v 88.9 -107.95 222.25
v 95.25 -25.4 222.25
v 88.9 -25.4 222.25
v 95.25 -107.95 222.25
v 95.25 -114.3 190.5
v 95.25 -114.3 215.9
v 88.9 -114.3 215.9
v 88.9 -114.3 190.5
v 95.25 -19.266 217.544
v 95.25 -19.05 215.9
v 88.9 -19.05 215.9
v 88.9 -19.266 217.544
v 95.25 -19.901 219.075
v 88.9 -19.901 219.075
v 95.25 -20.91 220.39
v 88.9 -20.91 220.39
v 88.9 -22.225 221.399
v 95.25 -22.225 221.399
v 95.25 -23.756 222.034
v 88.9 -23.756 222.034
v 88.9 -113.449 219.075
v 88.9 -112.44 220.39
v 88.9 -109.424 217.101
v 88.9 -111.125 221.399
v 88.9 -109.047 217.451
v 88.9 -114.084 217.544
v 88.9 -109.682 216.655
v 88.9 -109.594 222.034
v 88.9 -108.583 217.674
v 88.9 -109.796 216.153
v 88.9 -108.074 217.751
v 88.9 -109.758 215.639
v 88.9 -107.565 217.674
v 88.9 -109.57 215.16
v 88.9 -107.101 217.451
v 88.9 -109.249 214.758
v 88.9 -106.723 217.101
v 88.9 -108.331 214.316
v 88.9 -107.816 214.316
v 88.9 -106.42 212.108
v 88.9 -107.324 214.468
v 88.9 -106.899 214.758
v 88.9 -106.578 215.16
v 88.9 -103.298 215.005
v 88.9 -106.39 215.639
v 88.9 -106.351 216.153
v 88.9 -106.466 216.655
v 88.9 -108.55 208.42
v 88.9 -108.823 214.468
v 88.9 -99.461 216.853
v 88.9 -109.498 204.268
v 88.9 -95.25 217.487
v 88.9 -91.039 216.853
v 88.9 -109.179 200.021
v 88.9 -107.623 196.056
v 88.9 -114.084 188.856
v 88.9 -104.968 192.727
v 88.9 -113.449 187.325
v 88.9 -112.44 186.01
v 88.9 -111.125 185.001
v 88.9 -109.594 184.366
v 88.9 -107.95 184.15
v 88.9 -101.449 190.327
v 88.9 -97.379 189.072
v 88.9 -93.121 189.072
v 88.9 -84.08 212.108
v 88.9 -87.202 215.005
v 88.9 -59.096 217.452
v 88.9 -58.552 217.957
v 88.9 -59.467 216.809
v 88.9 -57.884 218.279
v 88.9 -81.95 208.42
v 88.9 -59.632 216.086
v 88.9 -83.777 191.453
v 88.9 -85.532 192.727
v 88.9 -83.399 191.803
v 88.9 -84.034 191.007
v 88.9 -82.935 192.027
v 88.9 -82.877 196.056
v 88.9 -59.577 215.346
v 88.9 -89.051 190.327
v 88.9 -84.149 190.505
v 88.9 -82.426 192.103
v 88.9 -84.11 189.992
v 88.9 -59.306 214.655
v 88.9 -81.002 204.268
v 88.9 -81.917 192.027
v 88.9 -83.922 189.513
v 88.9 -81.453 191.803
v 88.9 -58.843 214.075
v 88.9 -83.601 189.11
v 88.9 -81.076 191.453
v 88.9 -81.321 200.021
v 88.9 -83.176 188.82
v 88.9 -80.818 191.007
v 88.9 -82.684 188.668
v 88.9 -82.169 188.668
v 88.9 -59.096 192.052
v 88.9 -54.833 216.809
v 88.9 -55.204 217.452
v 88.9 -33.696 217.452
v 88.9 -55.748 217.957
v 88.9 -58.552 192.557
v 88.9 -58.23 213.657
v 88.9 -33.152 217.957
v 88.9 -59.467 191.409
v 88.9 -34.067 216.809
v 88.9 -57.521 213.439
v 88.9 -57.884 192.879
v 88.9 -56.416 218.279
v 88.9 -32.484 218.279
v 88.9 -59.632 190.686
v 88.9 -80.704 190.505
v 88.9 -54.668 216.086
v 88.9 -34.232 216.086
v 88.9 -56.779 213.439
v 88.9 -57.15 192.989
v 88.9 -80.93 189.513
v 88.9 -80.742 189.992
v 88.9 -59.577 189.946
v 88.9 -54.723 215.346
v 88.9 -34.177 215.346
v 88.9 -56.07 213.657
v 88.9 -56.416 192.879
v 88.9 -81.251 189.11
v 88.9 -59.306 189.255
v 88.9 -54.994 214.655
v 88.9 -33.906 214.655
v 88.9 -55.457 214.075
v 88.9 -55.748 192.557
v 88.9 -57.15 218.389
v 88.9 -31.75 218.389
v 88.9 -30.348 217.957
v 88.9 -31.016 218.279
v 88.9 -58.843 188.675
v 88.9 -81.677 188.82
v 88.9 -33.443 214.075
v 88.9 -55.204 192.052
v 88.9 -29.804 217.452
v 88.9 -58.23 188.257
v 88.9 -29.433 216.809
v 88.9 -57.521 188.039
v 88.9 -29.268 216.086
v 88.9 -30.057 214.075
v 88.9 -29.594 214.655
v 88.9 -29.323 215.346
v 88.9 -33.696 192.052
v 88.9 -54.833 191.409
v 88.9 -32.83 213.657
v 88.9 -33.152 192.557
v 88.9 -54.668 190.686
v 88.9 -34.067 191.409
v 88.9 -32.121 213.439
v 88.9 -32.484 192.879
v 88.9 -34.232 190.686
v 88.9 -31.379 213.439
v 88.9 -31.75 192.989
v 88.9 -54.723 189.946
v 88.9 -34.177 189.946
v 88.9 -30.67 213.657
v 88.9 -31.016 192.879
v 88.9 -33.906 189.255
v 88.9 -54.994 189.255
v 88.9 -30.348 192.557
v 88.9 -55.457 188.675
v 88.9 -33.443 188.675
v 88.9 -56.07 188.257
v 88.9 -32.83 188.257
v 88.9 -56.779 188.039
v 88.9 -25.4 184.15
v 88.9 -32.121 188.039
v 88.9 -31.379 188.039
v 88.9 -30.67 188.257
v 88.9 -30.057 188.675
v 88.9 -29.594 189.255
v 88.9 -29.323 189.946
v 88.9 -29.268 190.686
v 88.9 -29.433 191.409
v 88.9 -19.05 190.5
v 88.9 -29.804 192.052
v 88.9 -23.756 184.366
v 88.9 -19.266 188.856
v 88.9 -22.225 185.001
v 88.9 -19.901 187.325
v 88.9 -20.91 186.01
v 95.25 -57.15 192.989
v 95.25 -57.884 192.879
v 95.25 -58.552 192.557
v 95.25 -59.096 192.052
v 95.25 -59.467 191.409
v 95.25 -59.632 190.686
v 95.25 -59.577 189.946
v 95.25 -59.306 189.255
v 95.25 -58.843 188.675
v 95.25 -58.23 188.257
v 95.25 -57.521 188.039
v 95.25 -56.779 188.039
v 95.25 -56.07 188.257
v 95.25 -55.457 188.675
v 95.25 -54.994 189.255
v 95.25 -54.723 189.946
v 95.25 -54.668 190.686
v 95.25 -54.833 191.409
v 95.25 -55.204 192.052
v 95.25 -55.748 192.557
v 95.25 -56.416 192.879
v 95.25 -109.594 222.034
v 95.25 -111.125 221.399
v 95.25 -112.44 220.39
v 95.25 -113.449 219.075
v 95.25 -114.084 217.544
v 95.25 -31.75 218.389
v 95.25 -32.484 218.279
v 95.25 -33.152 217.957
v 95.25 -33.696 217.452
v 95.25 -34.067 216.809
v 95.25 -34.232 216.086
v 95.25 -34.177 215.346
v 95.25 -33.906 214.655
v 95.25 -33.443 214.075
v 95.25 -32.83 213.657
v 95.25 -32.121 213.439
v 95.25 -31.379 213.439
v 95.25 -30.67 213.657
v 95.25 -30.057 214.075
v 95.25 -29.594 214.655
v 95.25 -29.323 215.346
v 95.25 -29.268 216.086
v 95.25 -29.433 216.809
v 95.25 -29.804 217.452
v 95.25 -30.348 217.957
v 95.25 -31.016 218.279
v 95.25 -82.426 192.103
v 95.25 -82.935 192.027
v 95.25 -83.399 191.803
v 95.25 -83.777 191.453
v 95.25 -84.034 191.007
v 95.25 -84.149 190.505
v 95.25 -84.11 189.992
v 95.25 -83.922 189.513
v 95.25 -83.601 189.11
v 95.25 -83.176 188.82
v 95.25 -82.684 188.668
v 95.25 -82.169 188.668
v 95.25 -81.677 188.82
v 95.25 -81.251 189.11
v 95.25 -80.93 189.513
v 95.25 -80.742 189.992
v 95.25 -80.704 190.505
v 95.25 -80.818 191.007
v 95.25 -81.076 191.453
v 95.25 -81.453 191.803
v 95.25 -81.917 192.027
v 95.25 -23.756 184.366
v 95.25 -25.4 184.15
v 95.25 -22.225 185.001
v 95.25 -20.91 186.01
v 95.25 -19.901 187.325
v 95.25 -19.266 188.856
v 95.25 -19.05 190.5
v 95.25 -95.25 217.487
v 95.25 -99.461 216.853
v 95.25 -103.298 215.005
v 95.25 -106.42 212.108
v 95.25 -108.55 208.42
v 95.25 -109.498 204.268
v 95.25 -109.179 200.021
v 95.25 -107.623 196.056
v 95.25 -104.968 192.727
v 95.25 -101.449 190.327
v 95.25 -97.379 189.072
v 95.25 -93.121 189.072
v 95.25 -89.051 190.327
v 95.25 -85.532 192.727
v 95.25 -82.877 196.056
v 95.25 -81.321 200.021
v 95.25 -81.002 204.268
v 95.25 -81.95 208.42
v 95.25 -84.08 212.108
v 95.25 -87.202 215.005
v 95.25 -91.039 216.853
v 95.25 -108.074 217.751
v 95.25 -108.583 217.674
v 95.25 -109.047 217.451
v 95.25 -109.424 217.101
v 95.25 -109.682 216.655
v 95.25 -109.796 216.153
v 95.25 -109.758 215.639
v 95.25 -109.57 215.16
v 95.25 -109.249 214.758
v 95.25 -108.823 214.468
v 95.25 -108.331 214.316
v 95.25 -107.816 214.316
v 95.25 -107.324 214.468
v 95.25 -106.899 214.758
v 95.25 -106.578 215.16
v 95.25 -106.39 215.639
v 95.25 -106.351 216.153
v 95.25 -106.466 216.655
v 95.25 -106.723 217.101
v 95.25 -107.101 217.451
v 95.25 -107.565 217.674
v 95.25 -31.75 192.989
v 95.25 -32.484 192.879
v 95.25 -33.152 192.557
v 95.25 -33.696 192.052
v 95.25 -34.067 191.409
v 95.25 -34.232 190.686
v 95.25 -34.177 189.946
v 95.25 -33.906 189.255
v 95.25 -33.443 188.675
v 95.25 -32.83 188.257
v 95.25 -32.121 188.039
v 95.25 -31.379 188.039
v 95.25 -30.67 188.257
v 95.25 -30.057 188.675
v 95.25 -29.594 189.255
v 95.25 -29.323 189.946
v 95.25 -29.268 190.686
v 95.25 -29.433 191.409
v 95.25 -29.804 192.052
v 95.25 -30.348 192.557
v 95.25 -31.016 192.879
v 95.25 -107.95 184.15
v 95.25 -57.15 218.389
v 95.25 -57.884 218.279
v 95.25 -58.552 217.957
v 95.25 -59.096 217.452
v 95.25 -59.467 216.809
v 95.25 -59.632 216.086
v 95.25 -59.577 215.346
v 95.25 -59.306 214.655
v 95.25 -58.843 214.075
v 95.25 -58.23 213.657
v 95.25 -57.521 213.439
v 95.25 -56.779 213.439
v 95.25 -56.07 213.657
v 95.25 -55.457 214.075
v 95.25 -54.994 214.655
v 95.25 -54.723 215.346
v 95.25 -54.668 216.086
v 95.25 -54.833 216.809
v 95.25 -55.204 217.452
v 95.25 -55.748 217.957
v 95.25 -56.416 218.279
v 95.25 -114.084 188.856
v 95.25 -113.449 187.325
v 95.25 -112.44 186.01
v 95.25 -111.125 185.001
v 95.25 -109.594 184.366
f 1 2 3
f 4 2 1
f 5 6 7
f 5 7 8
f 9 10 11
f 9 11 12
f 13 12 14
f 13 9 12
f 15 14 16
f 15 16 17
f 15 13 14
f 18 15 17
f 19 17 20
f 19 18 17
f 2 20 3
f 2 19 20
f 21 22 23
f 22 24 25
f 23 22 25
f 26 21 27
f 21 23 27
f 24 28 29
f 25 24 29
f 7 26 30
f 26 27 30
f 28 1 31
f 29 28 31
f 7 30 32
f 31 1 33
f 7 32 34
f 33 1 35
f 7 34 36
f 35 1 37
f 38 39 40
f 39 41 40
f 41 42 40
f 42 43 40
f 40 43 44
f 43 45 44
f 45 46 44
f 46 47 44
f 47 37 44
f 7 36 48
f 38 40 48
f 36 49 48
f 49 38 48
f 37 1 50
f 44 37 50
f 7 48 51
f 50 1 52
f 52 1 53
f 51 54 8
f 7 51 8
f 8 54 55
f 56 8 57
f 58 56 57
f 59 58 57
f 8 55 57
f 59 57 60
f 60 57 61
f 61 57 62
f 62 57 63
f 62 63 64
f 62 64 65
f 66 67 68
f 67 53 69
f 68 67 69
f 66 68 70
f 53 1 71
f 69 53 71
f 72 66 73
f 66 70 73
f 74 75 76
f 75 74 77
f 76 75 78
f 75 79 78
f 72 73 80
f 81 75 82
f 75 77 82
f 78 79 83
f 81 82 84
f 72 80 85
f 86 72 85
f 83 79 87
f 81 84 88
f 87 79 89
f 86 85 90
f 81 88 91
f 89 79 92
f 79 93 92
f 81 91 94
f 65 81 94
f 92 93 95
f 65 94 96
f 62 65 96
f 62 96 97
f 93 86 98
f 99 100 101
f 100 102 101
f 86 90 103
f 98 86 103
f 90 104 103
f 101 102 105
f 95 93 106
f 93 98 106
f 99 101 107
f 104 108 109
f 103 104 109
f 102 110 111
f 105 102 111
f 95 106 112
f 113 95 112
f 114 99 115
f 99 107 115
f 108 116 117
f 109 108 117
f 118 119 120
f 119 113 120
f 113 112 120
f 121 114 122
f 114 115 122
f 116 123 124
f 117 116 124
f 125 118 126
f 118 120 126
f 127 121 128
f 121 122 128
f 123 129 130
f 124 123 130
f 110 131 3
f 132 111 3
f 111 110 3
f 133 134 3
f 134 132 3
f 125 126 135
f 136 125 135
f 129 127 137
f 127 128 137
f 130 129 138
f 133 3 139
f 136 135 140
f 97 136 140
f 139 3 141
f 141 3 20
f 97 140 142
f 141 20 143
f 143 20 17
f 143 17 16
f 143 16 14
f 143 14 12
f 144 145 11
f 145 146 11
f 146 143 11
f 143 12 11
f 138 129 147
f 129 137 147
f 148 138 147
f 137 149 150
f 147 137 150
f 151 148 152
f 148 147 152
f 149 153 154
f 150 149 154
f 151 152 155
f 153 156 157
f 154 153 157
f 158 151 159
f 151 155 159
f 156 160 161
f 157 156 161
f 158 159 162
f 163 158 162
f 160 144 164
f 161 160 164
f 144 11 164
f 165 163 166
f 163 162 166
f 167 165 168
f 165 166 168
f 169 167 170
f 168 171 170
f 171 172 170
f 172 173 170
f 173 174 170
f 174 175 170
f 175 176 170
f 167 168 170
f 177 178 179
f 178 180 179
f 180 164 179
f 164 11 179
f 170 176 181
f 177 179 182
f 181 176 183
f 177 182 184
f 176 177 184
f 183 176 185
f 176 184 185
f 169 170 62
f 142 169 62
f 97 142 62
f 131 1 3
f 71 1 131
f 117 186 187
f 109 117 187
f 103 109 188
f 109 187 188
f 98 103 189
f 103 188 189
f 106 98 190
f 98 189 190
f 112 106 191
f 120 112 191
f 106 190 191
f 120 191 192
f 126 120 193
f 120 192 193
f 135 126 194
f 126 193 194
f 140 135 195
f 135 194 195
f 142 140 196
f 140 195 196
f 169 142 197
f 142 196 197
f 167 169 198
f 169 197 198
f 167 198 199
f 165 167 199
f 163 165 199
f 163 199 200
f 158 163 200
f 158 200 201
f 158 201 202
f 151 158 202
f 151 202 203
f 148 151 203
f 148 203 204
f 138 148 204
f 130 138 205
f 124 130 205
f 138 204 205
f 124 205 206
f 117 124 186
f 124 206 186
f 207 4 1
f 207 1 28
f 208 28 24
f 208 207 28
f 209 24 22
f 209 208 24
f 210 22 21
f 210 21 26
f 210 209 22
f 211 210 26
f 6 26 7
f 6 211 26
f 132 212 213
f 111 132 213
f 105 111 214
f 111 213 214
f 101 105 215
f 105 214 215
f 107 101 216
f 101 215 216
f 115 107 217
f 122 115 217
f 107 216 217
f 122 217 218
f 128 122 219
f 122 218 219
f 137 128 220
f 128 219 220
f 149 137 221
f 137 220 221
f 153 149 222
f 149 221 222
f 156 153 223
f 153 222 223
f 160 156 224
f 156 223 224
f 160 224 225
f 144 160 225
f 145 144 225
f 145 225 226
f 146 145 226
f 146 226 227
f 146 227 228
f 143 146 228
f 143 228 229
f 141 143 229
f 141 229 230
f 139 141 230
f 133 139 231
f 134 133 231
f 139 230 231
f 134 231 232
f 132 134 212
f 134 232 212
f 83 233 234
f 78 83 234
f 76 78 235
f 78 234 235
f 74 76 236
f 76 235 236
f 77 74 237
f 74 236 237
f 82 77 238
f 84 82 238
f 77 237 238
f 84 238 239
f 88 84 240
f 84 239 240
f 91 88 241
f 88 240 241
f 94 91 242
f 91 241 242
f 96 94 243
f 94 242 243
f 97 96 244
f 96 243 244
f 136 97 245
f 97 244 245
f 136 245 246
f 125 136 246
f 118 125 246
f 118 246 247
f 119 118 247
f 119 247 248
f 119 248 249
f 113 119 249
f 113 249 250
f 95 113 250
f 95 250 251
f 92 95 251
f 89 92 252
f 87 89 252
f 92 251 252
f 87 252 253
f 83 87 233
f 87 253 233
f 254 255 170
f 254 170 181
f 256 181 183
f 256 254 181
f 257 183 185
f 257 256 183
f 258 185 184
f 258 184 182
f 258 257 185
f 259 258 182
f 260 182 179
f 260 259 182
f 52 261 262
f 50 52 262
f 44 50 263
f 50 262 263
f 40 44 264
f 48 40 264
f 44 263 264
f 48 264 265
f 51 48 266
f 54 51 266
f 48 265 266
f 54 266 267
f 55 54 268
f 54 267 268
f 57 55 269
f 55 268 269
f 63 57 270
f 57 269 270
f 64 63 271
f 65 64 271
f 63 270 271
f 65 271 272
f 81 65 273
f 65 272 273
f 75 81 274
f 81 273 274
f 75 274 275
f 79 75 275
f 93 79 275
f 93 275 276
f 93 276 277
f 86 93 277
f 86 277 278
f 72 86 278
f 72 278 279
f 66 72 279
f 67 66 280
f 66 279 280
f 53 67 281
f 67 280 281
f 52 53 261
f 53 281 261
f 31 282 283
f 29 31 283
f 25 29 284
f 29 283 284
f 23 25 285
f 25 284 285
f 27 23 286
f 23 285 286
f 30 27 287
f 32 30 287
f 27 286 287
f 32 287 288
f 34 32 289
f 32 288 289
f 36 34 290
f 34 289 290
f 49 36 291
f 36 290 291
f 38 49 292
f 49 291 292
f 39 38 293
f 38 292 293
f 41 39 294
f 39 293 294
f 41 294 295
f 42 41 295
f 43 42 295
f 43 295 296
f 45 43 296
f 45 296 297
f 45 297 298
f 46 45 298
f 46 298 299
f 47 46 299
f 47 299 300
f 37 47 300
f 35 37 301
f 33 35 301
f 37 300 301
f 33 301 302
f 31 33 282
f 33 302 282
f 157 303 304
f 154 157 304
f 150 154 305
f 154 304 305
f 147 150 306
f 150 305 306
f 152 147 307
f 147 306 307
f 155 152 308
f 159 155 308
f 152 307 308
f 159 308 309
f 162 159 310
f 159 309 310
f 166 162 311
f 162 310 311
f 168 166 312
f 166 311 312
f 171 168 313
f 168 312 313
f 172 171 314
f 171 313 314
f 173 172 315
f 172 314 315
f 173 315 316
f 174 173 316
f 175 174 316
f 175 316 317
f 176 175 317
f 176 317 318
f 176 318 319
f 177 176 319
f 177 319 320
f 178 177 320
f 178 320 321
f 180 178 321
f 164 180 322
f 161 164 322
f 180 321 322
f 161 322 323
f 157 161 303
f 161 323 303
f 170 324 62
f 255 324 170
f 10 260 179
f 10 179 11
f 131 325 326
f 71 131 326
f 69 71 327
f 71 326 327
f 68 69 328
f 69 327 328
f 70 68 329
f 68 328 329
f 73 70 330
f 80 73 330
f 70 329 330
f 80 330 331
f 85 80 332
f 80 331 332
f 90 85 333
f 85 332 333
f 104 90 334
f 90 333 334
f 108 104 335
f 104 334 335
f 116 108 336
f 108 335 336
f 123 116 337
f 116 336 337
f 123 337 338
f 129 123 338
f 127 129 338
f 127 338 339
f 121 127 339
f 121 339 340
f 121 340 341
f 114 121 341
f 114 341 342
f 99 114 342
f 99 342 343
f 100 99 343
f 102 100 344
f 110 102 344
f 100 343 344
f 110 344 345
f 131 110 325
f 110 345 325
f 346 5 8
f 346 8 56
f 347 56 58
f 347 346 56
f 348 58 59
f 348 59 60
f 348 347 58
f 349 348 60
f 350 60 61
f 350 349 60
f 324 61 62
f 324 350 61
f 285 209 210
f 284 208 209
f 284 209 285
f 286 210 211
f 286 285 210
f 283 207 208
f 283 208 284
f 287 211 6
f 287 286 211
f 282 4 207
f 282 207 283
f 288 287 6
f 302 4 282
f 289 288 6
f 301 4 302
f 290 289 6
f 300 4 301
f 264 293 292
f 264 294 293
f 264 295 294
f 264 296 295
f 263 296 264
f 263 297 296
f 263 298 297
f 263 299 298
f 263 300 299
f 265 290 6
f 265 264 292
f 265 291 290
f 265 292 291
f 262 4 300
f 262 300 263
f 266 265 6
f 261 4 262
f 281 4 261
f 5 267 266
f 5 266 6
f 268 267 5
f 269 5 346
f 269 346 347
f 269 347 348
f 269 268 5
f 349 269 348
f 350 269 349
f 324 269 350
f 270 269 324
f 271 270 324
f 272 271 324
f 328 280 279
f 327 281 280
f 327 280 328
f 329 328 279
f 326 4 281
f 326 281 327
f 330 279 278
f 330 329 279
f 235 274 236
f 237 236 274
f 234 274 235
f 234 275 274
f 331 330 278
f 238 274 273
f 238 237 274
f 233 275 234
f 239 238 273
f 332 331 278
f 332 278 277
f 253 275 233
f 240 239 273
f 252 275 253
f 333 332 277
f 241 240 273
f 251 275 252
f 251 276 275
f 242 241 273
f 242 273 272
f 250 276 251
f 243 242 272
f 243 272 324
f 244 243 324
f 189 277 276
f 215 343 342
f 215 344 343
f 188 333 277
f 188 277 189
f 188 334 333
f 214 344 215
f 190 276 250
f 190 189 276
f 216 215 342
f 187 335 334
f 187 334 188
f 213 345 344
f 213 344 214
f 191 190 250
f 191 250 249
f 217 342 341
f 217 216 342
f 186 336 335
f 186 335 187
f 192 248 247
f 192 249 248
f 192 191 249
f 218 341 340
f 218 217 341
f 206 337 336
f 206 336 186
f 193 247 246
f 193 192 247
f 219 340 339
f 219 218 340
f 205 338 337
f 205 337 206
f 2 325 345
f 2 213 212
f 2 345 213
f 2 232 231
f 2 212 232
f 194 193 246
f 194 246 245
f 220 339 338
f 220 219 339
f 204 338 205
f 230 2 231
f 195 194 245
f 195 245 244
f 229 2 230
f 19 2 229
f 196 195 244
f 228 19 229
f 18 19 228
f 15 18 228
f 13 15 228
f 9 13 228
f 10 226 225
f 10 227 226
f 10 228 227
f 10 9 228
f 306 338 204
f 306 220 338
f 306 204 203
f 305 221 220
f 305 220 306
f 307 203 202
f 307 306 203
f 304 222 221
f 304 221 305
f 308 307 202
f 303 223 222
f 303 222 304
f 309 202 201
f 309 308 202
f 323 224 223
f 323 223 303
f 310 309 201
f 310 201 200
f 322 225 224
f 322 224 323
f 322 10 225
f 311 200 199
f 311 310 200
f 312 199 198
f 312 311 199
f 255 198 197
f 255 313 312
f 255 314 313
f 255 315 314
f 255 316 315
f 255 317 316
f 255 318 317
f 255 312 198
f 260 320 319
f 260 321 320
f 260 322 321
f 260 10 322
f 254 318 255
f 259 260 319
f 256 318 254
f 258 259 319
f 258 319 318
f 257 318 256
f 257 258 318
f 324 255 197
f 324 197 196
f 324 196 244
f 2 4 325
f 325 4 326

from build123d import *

# Parameters (mm, degrees)
SKETCH1_R           = 1.7272
SKETCH1_R_2         = 14.2875
SKETCH1_R_3         = 2.4892
BOSS_EXTRUDE1_DEPTH = 6.35


with BuildPart() as part:
    # Sketch1 → Boss-Extrude1 (new body)
    with BuildSketch(Plane(origin=(95.25, 0, 0), x_dir=(0, 0, -1), z_dir=(1, 0, 0))):
        with BuildLine():
            Line((-184.15, -107.95), (-184.15, -25.4))
            ThreePointArc((-184.15, -25.4), (-186.009871939, -20.909871939), (-190.5, -19.05))
            Line((-190.5, -19.05), (-215.9, -19.05))
            ThreePointArc((-215.9, -19.05), (-220.390128061, -20.909871939), (-222.25, -25.4))
            Line((-222.25, -25.4), (-222.25, -107.95))
            ThreePointArc((-222.25, -107.95), (-220.390128061, -112.440128061), (-215.9, -114.3))
            Line((-215.9, -114.3), (-190.5, -114.3))
            ThreePointArc((-190.5, -114.3), (-186.009871939, -112.440128061), (-184.15, -107.95))
        make_face()
        with Locations(Location((-190.376194259, -82.426194259, 0), (0, 0, 180))):
            Circle(SKETCH1_R, mode=Mode.SUBTRACT)
        with Locations(Location((-216.023805741, -108.073805741, 0), (0, 0, 180))):
            Circle(SKETCH1_R, mode=Mode.SUBTRACT)
        with Locations(Location((-203.2, -95.25, 0), (0, 0, 180))):
            Circle(SKETCH1_R_2, mode=Mode.SUBTRACT)
        with Locations(Location((-215.9, -31.75, 0), (0, 0, 180))):
            Circle(SKETCH1_R_3, mode=Mode.SUBTRACT)
        with Locations(Location((-190.5, -31.75, 0), (0, 0, 180))):
            Circle(SKETCH1_R_3, mode=Mode.SUBTRACT)
        with Locations(Location((-215.9, -57.15, 0), (0, 0, 180))):
            Circle(SKETCH1_R_3, mode=Mode.SUBTRACT)
        with Locations(Location((-190.5, -57.15, 0), (0, 0, 180))):
            Circle(SKETCH1_R_3, mode=Mode.SUBTRACT)
    extrude(amount=-BOSS_EXTRUDE1_DEPTH)


solid = part.part
